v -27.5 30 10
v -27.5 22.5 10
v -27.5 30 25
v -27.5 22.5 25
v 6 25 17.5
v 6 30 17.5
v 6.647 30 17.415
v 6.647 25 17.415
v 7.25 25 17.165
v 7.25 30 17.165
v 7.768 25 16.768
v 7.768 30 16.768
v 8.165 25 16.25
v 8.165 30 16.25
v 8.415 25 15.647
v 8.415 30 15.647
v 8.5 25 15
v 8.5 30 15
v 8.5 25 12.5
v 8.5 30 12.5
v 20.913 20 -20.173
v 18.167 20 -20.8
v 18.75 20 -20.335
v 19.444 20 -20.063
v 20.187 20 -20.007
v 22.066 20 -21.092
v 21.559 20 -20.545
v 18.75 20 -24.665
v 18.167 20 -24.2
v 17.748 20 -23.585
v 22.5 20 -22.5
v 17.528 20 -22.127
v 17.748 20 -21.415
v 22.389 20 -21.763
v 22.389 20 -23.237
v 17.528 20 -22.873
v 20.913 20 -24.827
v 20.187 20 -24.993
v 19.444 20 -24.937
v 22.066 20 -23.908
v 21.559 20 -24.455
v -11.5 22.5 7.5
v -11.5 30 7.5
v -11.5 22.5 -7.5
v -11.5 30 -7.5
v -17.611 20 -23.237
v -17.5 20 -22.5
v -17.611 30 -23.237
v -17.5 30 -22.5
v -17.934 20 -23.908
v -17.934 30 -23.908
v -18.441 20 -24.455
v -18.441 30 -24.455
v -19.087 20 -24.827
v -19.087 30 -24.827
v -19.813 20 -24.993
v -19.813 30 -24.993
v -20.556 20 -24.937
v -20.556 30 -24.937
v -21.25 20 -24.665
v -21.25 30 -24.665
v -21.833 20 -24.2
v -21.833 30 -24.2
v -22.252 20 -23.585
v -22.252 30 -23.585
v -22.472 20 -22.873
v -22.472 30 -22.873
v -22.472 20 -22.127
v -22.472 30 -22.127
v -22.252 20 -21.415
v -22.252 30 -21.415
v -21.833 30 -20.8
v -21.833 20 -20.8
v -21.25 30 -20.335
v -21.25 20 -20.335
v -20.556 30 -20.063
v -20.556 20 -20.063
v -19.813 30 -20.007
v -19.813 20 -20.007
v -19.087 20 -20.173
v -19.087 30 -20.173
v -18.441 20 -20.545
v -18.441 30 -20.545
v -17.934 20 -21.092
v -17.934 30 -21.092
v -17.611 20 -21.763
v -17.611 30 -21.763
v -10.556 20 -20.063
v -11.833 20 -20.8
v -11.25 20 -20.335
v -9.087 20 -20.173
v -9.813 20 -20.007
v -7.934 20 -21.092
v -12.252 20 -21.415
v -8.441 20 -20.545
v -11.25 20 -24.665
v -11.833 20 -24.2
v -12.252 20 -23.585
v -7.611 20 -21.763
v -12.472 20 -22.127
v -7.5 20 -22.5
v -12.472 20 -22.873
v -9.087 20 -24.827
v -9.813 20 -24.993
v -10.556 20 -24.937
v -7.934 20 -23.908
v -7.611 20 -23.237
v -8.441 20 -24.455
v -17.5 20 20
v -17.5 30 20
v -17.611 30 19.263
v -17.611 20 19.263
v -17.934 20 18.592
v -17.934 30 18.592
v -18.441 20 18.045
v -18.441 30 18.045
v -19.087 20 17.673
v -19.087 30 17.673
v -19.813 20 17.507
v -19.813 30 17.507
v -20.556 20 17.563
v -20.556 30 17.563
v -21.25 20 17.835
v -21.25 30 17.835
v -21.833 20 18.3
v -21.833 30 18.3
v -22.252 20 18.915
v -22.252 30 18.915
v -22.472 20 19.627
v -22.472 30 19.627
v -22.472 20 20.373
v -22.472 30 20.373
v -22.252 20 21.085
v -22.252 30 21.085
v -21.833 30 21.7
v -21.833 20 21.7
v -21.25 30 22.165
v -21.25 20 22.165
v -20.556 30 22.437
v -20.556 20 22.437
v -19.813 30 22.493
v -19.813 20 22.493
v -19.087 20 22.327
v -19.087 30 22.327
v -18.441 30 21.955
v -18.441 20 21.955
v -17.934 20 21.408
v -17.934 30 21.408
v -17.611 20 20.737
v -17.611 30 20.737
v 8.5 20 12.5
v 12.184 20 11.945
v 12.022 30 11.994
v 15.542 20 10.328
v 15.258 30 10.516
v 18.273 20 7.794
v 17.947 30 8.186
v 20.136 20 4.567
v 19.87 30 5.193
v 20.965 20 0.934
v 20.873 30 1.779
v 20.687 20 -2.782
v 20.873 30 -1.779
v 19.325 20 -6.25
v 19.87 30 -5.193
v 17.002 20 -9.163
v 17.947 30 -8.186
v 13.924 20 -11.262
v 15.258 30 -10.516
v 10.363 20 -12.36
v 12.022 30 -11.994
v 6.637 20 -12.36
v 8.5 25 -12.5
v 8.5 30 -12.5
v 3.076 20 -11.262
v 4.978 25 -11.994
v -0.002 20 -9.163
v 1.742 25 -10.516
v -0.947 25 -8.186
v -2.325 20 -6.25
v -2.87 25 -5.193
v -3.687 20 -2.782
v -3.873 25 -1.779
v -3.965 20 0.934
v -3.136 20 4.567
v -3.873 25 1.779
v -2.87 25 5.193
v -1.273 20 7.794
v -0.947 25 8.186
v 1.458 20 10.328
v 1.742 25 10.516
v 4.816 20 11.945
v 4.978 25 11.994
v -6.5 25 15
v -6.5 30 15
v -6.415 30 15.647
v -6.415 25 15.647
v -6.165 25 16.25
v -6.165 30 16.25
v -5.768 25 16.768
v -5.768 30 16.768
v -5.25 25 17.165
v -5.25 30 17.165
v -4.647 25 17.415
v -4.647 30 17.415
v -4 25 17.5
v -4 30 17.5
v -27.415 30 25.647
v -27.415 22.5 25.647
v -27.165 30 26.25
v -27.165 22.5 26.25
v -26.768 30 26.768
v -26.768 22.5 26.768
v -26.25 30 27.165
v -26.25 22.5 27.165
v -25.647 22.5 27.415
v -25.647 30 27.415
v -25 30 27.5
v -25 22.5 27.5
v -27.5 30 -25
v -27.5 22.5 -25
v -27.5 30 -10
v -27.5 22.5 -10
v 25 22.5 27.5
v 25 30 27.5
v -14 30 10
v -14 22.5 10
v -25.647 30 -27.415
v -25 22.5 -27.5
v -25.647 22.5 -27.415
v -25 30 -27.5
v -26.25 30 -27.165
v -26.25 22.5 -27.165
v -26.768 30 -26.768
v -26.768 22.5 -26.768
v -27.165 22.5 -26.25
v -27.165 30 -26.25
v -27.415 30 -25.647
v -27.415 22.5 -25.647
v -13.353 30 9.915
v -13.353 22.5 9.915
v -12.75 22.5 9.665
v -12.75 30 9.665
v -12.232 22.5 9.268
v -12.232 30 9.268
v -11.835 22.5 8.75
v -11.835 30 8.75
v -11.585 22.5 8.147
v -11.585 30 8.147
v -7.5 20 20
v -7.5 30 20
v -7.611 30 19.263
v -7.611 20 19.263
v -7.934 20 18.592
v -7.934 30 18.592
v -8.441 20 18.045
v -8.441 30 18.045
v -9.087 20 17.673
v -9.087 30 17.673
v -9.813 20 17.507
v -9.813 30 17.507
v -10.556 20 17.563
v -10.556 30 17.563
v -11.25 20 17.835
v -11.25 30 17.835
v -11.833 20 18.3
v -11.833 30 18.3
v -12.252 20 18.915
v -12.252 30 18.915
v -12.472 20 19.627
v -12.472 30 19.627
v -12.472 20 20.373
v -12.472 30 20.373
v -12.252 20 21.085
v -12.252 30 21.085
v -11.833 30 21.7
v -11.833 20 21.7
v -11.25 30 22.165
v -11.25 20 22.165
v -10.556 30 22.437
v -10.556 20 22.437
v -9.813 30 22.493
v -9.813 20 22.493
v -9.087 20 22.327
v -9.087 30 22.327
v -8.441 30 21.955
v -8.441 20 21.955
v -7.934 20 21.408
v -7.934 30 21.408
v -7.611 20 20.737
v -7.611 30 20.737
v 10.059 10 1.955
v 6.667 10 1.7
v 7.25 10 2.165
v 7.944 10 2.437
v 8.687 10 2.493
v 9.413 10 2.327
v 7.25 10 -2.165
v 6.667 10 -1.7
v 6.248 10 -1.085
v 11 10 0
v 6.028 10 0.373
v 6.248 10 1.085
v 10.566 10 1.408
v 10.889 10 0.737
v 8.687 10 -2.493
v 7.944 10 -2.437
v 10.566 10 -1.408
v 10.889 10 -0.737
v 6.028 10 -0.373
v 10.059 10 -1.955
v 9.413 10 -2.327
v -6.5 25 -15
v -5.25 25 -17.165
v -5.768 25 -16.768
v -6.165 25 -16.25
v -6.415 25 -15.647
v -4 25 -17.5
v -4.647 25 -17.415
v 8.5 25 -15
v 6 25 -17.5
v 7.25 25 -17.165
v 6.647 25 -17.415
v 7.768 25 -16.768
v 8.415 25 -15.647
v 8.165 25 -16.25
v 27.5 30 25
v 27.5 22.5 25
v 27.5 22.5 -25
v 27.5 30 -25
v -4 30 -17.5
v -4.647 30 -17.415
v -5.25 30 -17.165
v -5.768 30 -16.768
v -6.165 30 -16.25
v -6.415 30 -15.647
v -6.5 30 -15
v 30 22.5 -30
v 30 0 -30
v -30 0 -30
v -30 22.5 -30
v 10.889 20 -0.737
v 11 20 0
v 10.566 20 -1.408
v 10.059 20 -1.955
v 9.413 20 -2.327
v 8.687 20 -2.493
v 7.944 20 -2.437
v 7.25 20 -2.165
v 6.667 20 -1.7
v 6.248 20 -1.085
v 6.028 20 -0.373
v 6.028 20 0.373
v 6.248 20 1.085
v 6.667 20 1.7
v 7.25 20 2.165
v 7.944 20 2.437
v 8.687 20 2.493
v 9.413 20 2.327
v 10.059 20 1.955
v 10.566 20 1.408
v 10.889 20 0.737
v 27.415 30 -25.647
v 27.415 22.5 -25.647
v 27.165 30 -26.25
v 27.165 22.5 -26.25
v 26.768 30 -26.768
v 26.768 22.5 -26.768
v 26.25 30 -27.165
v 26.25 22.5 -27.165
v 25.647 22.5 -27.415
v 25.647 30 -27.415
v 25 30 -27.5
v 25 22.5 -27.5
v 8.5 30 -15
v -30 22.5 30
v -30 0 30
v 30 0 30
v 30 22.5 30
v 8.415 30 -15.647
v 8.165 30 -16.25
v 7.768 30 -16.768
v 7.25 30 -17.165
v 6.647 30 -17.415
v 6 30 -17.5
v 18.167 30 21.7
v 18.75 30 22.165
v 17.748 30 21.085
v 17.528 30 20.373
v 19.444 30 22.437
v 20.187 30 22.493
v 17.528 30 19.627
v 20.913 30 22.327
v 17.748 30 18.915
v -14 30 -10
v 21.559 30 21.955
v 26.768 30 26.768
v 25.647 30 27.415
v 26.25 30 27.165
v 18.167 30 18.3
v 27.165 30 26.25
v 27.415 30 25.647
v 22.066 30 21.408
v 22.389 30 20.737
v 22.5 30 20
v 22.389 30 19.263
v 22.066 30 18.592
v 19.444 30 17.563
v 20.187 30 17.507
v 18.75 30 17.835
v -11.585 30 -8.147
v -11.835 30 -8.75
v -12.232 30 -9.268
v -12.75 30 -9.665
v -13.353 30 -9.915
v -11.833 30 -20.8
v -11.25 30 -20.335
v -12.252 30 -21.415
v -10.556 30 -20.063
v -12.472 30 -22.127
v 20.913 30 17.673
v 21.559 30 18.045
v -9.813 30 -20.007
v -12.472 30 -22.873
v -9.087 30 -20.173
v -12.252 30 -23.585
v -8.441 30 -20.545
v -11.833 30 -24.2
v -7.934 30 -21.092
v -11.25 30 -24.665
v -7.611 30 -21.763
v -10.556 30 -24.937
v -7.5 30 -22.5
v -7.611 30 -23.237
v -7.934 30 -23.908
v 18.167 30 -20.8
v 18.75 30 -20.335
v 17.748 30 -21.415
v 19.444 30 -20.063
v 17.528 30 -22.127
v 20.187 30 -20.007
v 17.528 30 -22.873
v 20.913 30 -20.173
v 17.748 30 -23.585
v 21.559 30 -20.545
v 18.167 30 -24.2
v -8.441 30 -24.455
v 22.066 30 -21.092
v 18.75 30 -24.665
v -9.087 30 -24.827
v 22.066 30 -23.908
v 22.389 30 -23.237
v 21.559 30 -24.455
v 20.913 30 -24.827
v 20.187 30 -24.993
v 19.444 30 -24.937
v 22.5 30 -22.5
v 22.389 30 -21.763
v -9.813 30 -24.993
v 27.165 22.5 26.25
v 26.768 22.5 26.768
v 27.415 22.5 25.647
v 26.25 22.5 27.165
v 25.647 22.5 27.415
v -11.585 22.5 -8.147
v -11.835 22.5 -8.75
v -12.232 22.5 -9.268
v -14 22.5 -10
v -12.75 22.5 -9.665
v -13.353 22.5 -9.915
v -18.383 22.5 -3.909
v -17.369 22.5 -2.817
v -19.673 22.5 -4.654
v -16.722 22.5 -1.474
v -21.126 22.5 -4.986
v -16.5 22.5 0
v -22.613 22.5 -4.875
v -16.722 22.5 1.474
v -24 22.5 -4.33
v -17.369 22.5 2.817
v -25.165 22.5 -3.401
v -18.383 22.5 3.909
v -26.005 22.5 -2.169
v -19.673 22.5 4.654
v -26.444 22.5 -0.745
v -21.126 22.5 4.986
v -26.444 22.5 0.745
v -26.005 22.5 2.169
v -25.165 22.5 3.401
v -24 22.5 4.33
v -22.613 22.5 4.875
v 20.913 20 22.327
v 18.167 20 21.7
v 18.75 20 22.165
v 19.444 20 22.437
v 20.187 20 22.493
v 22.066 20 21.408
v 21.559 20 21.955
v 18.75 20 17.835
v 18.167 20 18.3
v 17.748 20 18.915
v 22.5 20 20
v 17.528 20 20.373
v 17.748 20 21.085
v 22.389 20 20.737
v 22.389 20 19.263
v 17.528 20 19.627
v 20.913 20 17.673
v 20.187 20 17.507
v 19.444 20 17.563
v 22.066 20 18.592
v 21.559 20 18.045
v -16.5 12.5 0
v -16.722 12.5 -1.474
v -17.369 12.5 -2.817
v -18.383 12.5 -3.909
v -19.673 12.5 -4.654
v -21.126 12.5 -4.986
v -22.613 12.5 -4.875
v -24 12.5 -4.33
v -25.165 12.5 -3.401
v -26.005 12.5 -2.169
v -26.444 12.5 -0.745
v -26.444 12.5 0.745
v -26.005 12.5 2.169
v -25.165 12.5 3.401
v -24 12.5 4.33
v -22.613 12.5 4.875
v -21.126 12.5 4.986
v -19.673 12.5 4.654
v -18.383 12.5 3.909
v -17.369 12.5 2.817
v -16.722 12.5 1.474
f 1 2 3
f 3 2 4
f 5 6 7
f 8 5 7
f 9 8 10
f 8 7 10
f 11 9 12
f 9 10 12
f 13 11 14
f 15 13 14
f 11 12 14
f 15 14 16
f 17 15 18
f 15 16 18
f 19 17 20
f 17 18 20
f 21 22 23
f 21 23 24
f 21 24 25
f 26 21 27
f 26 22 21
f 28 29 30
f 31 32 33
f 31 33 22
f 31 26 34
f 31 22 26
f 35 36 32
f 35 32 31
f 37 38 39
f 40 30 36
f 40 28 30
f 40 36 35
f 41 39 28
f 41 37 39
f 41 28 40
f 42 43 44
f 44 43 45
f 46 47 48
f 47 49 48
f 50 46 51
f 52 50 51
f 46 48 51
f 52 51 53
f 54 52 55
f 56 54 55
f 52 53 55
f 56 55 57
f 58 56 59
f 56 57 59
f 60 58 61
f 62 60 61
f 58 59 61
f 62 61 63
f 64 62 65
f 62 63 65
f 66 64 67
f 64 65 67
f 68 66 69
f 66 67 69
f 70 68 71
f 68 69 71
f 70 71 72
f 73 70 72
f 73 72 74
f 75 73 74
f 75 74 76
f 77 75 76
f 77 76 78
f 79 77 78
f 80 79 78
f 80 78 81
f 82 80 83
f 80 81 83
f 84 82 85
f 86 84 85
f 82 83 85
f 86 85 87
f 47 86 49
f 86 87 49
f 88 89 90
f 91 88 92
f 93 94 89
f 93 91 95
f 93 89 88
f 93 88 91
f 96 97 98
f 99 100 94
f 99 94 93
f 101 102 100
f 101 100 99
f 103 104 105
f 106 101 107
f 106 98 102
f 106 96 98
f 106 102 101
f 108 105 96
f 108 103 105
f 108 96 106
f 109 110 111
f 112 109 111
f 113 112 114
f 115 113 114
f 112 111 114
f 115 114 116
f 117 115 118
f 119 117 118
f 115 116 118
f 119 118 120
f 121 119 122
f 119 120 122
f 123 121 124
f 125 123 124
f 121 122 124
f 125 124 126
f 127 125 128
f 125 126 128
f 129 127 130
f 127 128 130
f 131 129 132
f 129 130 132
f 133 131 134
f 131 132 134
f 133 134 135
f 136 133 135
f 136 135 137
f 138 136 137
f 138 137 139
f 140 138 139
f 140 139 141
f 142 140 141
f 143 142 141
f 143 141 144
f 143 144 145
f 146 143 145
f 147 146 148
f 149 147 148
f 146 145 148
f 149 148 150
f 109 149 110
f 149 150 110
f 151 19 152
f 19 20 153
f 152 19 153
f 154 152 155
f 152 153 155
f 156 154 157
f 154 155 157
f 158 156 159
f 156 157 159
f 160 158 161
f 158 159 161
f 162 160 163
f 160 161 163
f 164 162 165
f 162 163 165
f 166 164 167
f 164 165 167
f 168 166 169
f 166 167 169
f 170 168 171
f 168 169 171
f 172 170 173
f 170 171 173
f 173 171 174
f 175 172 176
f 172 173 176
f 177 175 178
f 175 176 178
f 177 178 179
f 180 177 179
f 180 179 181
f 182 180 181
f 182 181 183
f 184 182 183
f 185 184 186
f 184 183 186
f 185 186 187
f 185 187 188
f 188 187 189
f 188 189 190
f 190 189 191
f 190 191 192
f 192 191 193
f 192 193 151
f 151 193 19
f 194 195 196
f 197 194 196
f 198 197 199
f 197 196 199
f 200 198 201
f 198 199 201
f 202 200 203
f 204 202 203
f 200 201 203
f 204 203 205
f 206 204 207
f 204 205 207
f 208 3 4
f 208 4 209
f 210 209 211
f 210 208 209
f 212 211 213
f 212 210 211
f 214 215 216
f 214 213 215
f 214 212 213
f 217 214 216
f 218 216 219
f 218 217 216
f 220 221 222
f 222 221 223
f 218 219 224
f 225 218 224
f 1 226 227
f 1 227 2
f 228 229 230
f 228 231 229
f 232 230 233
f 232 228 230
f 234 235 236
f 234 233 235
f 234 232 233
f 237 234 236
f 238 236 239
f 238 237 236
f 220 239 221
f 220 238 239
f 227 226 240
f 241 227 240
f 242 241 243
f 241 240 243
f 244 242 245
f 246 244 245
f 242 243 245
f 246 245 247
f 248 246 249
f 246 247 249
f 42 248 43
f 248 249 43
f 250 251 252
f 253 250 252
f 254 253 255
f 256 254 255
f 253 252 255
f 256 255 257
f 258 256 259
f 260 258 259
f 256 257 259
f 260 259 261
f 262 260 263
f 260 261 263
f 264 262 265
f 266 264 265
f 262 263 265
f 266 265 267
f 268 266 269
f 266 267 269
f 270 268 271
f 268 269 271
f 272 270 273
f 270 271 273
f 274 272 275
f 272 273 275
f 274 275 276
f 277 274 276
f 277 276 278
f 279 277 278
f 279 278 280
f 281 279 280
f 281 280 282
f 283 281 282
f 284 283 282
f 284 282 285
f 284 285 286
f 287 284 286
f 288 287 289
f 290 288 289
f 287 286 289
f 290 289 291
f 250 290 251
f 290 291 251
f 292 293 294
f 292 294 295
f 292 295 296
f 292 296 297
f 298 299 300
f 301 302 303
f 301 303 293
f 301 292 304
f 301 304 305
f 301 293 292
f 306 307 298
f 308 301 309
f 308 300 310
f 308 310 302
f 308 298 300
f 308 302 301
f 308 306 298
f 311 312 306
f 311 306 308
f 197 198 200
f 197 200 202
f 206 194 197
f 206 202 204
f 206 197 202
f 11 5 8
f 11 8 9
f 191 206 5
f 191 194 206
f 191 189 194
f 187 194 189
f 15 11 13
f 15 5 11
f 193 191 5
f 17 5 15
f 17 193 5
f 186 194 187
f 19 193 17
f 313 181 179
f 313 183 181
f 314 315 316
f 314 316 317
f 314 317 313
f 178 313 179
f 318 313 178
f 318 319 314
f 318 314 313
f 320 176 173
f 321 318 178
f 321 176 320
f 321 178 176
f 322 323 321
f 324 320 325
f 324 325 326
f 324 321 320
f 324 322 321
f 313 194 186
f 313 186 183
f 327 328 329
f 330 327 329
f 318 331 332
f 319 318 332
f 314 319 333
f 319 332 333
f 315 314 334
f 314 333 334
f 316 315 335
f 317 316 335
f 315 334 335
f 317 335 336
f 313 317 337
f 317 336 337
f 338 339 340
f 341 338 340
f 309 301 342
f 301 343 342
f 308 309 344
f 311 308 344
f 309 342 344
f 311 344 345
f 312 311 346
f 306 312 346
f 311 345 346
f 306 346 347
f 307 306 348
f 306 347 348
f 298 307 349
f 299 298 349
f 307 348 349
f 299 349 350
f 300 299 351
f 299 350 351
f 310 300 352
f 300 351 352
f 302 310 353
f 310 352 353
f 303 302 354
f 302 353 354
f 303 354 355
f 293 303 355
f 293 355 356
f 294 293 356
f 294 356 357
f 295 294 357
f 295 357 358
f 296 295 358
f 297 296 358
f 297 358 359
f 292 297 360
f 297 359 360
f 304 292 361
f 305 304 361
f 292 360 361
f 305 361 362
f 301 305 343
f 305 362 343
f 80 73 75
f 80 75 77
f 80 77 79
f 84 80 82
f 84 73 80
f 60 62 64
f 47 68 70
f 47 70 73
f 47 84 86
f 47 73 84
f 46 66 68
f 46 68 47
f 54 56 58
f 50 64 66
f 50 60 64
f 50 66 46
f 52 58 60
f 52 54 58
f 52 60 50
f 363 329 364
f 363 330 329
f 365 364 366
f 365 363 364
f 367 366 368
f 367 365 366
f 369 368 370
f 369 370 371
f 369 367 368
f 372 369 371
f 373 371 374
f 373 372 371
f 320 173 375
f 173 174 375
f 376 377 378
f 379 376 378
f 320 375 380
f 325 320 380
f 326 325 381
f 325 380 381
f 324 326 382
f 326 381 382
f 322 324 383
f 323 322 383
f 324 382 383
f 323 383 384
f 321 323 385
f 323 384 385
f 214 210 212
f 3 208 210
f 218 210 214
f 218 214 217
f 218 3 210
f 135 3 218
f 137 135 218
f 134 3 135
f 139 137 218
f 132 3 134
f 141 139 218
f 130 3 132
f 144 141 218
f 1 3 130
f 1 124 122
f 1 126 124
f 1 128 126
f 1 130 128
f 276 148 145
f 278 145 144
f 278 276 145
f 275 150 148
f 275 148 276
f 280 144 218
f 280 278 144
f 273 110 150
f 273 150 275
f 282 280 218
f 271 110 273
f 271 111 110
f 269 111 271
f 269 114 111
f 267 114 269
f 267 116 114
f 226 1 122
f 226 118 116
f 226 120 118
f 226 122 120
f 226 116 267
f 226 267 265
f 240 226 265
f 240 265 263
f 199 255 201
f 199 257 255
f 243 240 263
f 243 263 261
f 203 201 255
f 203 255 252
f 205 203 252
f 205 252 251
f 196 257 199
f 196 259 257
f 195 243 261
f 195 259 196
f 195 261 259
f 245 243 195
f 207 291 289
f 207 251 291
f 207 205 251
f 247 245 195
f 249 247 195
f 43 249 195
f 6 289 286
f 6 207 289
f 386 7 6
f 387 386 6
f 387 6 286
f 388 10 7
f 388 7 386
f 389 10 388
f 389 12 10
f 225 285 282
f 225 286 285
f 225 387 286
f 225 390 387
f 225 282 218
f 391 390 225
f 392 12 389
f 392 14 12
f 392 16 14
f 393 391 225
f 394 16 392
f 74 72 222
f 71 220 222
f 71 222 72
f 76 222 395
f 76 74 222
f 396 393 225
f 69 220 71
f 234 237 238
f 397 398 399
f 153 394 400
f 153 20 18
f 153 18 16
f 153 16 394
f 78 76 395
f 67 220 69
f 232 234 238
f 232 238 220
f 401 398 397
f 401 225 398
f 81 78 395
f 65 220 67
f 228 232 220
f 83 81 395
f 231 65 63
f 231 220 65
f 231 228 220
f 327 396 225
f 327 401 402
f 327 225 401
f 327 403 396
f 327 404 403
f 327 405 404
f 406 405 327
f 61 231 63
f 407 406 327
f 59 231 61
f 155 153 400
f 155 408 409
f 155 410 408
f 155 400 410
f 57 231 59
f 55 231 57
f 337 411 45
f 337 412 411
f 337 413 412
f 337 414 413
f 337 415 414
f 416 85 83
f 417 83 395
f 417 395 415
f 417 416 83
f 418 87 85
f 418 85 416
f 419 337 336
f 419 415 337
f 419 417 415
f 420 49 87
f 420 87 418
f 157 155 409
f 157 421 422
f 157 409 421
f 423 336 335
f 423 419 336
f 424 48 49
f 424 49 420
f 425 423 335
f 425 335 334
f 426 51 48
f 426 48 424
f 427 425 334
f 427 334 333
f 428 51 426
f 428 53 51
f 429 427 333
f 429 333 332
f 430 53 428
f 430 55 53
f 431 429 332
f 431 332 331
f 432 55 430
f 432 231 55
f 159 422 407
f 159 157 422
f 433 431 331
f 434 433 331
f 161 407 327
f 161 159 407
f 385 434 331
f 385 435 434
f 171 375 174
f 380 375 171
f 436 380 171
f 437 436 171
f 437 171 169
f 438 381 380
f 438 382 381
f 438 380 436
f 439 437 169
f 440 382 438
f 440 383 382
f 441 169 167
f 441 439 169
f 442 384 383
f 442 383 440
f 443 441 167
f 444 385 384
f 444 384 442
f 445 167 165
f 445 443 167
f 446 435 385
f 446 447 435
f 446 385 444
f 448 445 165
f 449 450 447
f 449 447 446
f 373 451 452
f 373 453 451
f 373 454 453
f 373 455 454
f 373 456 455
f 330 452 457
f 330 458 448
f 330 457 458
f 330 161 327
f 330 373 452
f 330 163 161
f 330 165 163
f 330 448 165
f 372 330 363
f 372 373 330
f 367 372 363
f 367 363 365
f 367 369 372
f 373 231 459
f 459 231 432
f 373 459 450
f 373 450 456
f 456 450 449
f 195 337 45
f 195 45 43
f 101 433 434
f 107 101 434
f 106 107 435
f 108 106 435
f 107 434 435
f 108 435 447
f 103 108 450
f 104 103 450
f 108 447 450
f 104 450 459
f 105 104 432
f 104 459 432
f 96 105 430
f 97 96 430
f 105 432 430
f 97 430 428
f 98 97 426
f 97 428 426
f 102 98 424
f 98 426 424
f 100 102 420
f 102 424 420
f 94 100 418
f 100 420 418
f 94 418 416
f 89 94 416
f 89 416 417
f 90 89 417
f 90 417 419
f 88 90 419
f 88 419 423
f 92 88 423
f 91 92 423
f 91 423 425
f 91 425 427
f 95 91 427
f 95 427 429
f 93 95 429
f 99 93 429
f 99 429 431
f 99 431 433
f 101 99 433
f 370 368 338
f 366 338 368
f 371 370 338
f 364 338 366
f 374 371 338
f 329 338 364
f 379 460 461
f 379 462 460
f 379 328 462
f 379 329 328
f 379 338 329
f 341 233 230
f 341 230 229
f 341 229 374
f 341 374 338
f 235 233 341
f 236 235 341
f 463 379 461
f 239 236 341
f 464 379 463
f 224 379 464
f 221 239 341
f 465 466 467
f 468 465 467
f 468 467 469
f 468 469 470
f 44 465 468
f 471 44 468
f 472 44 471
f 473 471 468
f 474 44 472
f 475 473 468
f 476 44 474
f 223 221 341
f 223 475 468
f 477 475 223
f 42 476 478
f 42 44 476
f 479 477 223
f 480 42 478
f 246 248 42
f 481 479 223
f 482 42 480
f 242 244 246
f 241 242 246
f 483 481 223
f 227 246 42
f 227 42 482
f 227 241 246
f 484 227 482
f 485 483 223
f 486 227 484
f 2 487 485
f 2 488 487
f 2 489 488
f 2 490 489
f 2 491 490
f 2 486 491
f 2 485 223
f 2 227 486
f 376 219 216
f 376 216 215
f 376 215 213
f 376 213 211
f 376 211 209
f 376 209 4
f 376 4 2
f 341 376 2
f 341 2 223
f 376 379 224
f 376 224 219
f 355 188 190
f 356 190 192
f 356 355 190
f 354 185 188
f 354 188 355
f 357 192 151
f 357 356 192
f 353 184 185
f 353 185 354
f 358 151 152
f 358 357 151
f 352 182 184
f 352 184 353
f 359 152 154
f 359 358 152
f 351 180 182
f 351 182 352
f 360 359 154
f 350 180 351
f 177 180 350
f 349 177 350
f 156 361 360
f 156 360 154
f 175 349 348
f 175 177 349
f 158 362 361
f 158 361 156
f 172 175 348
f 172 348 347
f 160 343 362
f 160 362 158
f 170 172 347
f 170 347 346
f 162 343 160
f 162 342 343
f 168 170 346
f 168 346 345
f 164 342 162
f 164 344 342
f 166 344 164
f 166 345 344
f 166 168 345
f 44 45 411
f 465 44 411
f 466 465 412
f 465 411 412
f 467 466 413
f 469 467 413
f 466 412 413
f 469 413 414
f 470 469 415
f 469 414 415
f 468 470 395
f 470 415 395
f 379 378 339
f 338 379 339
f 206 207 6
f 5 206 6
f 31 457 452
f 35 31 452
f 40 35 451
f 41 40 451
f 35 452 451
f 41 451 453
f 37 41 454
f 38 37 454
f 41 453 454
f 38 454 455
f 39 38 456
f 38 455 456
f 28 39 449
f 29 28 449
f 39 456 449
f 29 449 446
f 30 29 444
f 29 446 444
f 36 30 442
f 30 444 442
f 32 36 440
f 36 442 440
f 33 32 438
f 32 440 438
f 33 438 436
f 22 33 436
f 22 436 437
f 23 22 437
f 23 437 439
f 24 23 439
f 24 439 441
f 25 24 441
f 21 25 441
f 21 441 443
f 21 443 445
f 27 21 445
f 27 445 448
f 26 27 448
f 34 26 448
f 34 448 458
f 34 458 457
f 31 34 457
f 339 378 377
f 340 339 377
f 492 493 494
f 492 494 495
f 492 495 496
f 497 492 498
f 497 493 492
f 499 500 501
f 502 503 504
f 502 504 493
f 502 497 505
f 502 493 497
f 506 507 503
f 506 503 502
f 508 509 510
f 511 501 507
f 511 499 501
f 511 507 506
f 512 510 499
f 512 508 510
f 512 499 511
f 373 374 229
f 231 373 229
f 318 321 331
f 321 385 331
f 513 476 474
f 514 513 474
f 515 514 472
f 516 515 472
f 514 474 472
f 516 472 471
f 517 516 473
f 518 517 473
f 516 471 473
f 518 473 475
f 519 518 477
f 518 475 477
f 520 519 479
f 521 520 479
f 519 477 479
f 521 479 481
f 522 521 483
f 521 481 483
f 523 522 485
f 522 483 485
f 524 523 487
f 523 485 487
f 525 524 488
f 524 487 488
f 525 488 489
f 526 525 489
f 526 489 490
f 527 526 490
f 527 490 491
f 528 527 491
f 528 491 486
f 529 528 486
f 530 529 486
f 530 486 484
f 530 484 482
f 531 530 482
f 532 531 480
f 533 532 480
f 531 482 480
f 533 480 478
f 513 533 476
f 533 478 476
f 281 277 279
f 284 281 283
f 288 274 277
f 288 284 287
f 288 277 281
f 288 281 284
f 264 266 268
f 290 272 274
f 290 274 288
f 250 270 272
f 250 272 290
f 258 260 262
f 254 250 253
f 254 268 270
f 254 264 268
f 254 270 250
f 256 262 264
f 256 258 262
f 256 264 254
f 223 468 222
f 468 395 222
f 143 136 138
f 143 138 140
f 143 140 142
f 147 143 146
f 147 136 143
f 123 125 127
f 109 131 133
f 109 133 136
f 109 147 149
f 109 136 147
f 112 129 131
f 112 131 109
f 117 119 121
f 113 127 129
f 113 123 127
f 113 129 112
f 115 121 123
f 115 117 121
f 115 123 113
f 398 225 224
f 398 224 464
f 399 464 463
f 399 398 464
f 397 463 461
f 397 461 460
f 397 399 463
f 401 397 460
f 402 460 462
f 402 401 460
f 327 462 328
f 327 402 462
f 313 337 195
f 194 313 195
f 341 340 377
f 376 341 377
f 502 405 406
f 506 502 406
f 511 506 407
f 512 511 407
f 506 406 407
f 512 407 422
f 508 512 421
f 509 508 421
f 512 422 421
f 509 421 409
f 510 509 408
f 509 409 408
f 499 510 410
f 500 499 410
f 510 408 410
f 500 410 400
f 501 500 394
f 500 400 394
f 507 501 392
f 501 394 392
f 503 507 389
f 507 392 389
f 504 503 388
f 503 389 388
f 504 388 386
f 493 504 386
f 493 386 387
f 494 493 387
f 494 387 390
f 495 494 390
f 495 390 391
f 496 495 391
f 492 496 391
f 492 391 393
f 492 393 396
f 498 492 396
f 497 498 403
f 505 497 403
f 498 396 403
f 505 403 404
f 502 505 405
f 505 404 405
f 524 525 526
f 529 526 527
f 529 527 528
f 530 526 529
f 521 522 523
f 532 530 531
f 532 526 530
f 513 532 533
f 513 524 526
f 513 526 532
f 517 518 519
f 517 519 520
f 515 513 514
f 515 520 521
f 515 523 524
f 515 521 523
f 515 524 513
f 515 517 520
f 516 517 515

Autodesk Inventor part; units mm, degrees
ref_plane "YZ Plane" through (0, 0, 0) normal (1, 0, 0) x (0, 1, 0)
ref_plane "XZ Plane" through (0, 0, 0) normal (0, 1, 0) x (-1, 0, 0)
ref_plane "XY Plane" through (0, 0, 0) normal (0, 0, 1) x (1, 0, 0)
sketch "Sketch1" plane through (0, 0, 0) normal (0, 1, 0) x (-1, 0, 0)
  line L0 (30, 30) -> (-30, 30)
  line L1 (-30, 30) -> (-30, -30)
  line L2 (-30, -30) -> (30, -30)
  line L3 (30, -30) -> (30, 30)
  line L4 (30, 30) -> (-30, -30) construction
  line L5 (-30, 30) -> (30, -30) construction
  point P0 (0, 0)
  dimension "d0" = 60
  dimension "d1" = 60
extrude "Extrusion1" add sketch "Sketch1" along normal blind 22.5
sketch "Sketch2" plane through (0, 22.5, 0) normal (0, 1, 0) x (1, 0, 0)
  line L0 (-27.5, -27.5) -> (27.5, -27.5)
  line L1 (27.5, -27.5) -> (27.5, 27.5)
  line L2 (27.5, 27.5) -> (-27.5, 27.5)
  line L3 (-27.5, 27.5) -> (-27.5, -27.5)
  line L4 (-27.5, -27.5) -> (27.5, 27.5) construction
  line L5 (27.5, -27.5) -> (-27.5, 27.5) construction
  line L6 (30, 30) -> (-30, 30) projected
  line L7 (-30, 30) -> (-30, -30) projected
  point P0 (0, 0)
  dimension "d4" = 2.5
  dimension "d5" = 2.5
extrude "Extrusion2" add sketch "Sketch2" along normal blind 7.5
sketch "Sketch5" plane through (0, 30, 0) normal (0, 1, 0) x (1, 0, 0)
  point P0 (0, 0)
sketch "Sketch6" plane through (0, 30, 0) normal (0, 1, 0) x (1, 0, 0)
  circle A0 centre (20, 22.5) radius 2.5
  circle A1 centre (-20, 22.5) radius 2.5
  line L0 (-30, -30) -> (30, -30) projected
  line L1 (30, -30) -> (30, 30) projected
  line L2 (-30, 30) -> (-30, -30) projected
  circle A2 centre (20, -20) radius 2.5
  circle A3 centre (-20, -20) radius 2.5
  line L3 (-27.5, -27.5) -> (27.5, -27.5) projected
  line L4 (27.5, 27.5) -> (-27.5, 27.5) projected
  circle A4 centre (-10, -20) radius 2.5
  circle A5 centre (-10, 22.5) radius 2.5
  point P0 (0, 0)
  dimension "d15" = 5
  dimension "d16" = 52.5
  dimension "d17" = 52.5
  dimension "d18" = 10
  dimension "d19" = 10
  dimension "d20" = 5
  dimension "d21" = 5
  dimension "d22" = 10
  dimension "d23" = 10
  dimension "d24" = 10
  dimension "d25" = 10
  dimension "d26" = 5
  dimension "d27" = 55
  dimension "d28" = 57.5
  dimension "d66" = 5
  dimension "d67" = 5
  dimension "d68" = 40
  dimension "d69" = 40
extrude "Extrusion5" cut sketch "Sketch6" against normal blind 10
sketch "Sketch7" plane through (0, 30, 0) normal (0, 1, 0) x (1, 0, 0)
  arc A0 (8.5, -12.5) -> (8.5, 12.5) centre (8.5, 0) ccw
  line L0 (30, -30) -> (30, 30) projected
  line L1 (8.5, 0) -> (8.5, 12.5)
  line L2 (8.5, 0) -> (8.5, -12.5)
  point P0 (0, 0)
  dimension "d32" = 21.5
extrude "Extrusion6" cut sketch "Sketch7" against normal blind 10
sketch "Sketch8" plane through (0, 30, 0) normal (0, 1, 0) x (1, 0, 0)
  line L0 (-4, -17.5) -> (6, -17.5)
  line L1 (8.5, -15) -> (8.5, 15)
  line L2 (6, 17.5) -> (-4, 17.5)
  line L3 (-6.5, 15) -> (-6.5, -15)
  line L4 (-6.5, -17.5) -> (8.5, 17.5) construction
  line L5 (8.5, -17.5) -> (-6.5, 17.5) construction
  line L6 (30, -30) -> (30, 30) projected
  line L7 (8.5, -12.5) -> (8.5, 12.5) projected
  arc A0 (8.5, 12.5) -> (8.5, -12.5) centre (8.5, 0) ccw
  arc A1 (-4, 17.5) -> (-6.5, 15) centre (-4, 15) ccw
  arc A2 (8.5, 15) -> (6, 17.5) centre (6, 15) ccw
  arc A3 (-6.5, -15) -> (-4, -17.5) centre (-4, -15) ccw
  arc A4 (6, -17.5) -> (8.5, -15) centre (6, -15) ccw
  point P0 (0, 0)
  point P1 (1, 0)
  dimension "d35" = 35
  dimension "d37" = 21.5
extrude "Extrusion7" cut sketch "Sketch8" against normal blind 5
sketch "Sketch9" plane through (0, 25, 0) normal (0, 1, 0) x (1, 0, 0)
  line L0 (8.5, -12.5) -> (8.5, 12.5) projected
  arc A0 (8.5, 12.5) -> (8.5, -12.5) centre (8.5, 0) ccw
  line L1 (8.5, -12.5) -> (8.5, -15) projected
  line L2 (8.5, 15) -> (8.5, 12.5) projected
  line L3 (8.5, -12.5) -> (8.5, 12.5)
  point P0 (0, 0)
extrude "Extrusion8" cut sketch "Sketch9" against normal blind 5
sketch "Sketch11" plane through (8.5, 20, 0) normal (0, 1, 0) x (1, 0, 0)
  circle A0 centre (0, 0) radius 2.5
  line L0 (21.5, -30) -> (21.5, 30) projected
  point P0 (-8.5, 0)
  dimension "d55" = 21.5
  dimension "d56" = 5
extrude "Extrusion10" cut sketch "Sketch11" against normal blind 10
sketch "Sketch12" plane through (0, 30, 0) normal (0, 1, 0) x (1, 0, 0)
  line L0 (-27.5, -27.5) -> (-27.5, 27.5) projected
  line L1 (-27.5, 0) -> (-19.0189, 0)
  line L2 (-27.5, 10) -> (-27.5, -10)
  line L3 (-11.5, -7.5) -> (-11.5, 7.5)
  line L4 (-14, 10) -> (-27.5, 10)
  line L5 (-14, -10) -> (-27.5, -10)
  line L6 (30, -30) -> (30, 30) projected
  arc A0 (-11.5, 7.5) -> (-14, 10) centre (-14, 7.5) ccw
  arc A1 (-14, -10) -> (-11.5, -7.5) centre (-14, -7.5) ccw
  point P0 (0, 0)
  dimension "d59" = 20
  dimension "d60" = 10
  dimension "d61" = 41.5
extrude "Extrusion11" cut sketch "Sketch12" against normal blind 7.5
sketch "Sketch13" plane through (0, 30, 0) normal (0, 1, 0) x (1, 0, 0)
  point P0 (0, 0)
sketch "Sketch14" plane through (0, 22.5, 0) normal (0, 1, 0) x (1, 0, 0)
  circle A0 centre (-21.5, 0) radius 5
  line L0 (30, -30) -> (30, 30) projected
  point P0 (0, 0)
  dimension "d70" = 10
  dimension "d71" = 51.5
extrude "Extrusion12" cut sketch "Sketch14" against normal blind 10
fillet "Fillet1" radius 2.5 1 edges at (-27.5, 26.25, -27.5)
fillet "Fillet2" radius 2.5 1 edges at (-27.5, 26.25, 27.5)
fillet "Fillet3" radius 2.5 1 edges at (27.5, 26.25, 27.5)
fillet "Fillet4" radius 2.5 1 edges at (27.5, 26.25, -27.5)
properties part number "Exercise1"
